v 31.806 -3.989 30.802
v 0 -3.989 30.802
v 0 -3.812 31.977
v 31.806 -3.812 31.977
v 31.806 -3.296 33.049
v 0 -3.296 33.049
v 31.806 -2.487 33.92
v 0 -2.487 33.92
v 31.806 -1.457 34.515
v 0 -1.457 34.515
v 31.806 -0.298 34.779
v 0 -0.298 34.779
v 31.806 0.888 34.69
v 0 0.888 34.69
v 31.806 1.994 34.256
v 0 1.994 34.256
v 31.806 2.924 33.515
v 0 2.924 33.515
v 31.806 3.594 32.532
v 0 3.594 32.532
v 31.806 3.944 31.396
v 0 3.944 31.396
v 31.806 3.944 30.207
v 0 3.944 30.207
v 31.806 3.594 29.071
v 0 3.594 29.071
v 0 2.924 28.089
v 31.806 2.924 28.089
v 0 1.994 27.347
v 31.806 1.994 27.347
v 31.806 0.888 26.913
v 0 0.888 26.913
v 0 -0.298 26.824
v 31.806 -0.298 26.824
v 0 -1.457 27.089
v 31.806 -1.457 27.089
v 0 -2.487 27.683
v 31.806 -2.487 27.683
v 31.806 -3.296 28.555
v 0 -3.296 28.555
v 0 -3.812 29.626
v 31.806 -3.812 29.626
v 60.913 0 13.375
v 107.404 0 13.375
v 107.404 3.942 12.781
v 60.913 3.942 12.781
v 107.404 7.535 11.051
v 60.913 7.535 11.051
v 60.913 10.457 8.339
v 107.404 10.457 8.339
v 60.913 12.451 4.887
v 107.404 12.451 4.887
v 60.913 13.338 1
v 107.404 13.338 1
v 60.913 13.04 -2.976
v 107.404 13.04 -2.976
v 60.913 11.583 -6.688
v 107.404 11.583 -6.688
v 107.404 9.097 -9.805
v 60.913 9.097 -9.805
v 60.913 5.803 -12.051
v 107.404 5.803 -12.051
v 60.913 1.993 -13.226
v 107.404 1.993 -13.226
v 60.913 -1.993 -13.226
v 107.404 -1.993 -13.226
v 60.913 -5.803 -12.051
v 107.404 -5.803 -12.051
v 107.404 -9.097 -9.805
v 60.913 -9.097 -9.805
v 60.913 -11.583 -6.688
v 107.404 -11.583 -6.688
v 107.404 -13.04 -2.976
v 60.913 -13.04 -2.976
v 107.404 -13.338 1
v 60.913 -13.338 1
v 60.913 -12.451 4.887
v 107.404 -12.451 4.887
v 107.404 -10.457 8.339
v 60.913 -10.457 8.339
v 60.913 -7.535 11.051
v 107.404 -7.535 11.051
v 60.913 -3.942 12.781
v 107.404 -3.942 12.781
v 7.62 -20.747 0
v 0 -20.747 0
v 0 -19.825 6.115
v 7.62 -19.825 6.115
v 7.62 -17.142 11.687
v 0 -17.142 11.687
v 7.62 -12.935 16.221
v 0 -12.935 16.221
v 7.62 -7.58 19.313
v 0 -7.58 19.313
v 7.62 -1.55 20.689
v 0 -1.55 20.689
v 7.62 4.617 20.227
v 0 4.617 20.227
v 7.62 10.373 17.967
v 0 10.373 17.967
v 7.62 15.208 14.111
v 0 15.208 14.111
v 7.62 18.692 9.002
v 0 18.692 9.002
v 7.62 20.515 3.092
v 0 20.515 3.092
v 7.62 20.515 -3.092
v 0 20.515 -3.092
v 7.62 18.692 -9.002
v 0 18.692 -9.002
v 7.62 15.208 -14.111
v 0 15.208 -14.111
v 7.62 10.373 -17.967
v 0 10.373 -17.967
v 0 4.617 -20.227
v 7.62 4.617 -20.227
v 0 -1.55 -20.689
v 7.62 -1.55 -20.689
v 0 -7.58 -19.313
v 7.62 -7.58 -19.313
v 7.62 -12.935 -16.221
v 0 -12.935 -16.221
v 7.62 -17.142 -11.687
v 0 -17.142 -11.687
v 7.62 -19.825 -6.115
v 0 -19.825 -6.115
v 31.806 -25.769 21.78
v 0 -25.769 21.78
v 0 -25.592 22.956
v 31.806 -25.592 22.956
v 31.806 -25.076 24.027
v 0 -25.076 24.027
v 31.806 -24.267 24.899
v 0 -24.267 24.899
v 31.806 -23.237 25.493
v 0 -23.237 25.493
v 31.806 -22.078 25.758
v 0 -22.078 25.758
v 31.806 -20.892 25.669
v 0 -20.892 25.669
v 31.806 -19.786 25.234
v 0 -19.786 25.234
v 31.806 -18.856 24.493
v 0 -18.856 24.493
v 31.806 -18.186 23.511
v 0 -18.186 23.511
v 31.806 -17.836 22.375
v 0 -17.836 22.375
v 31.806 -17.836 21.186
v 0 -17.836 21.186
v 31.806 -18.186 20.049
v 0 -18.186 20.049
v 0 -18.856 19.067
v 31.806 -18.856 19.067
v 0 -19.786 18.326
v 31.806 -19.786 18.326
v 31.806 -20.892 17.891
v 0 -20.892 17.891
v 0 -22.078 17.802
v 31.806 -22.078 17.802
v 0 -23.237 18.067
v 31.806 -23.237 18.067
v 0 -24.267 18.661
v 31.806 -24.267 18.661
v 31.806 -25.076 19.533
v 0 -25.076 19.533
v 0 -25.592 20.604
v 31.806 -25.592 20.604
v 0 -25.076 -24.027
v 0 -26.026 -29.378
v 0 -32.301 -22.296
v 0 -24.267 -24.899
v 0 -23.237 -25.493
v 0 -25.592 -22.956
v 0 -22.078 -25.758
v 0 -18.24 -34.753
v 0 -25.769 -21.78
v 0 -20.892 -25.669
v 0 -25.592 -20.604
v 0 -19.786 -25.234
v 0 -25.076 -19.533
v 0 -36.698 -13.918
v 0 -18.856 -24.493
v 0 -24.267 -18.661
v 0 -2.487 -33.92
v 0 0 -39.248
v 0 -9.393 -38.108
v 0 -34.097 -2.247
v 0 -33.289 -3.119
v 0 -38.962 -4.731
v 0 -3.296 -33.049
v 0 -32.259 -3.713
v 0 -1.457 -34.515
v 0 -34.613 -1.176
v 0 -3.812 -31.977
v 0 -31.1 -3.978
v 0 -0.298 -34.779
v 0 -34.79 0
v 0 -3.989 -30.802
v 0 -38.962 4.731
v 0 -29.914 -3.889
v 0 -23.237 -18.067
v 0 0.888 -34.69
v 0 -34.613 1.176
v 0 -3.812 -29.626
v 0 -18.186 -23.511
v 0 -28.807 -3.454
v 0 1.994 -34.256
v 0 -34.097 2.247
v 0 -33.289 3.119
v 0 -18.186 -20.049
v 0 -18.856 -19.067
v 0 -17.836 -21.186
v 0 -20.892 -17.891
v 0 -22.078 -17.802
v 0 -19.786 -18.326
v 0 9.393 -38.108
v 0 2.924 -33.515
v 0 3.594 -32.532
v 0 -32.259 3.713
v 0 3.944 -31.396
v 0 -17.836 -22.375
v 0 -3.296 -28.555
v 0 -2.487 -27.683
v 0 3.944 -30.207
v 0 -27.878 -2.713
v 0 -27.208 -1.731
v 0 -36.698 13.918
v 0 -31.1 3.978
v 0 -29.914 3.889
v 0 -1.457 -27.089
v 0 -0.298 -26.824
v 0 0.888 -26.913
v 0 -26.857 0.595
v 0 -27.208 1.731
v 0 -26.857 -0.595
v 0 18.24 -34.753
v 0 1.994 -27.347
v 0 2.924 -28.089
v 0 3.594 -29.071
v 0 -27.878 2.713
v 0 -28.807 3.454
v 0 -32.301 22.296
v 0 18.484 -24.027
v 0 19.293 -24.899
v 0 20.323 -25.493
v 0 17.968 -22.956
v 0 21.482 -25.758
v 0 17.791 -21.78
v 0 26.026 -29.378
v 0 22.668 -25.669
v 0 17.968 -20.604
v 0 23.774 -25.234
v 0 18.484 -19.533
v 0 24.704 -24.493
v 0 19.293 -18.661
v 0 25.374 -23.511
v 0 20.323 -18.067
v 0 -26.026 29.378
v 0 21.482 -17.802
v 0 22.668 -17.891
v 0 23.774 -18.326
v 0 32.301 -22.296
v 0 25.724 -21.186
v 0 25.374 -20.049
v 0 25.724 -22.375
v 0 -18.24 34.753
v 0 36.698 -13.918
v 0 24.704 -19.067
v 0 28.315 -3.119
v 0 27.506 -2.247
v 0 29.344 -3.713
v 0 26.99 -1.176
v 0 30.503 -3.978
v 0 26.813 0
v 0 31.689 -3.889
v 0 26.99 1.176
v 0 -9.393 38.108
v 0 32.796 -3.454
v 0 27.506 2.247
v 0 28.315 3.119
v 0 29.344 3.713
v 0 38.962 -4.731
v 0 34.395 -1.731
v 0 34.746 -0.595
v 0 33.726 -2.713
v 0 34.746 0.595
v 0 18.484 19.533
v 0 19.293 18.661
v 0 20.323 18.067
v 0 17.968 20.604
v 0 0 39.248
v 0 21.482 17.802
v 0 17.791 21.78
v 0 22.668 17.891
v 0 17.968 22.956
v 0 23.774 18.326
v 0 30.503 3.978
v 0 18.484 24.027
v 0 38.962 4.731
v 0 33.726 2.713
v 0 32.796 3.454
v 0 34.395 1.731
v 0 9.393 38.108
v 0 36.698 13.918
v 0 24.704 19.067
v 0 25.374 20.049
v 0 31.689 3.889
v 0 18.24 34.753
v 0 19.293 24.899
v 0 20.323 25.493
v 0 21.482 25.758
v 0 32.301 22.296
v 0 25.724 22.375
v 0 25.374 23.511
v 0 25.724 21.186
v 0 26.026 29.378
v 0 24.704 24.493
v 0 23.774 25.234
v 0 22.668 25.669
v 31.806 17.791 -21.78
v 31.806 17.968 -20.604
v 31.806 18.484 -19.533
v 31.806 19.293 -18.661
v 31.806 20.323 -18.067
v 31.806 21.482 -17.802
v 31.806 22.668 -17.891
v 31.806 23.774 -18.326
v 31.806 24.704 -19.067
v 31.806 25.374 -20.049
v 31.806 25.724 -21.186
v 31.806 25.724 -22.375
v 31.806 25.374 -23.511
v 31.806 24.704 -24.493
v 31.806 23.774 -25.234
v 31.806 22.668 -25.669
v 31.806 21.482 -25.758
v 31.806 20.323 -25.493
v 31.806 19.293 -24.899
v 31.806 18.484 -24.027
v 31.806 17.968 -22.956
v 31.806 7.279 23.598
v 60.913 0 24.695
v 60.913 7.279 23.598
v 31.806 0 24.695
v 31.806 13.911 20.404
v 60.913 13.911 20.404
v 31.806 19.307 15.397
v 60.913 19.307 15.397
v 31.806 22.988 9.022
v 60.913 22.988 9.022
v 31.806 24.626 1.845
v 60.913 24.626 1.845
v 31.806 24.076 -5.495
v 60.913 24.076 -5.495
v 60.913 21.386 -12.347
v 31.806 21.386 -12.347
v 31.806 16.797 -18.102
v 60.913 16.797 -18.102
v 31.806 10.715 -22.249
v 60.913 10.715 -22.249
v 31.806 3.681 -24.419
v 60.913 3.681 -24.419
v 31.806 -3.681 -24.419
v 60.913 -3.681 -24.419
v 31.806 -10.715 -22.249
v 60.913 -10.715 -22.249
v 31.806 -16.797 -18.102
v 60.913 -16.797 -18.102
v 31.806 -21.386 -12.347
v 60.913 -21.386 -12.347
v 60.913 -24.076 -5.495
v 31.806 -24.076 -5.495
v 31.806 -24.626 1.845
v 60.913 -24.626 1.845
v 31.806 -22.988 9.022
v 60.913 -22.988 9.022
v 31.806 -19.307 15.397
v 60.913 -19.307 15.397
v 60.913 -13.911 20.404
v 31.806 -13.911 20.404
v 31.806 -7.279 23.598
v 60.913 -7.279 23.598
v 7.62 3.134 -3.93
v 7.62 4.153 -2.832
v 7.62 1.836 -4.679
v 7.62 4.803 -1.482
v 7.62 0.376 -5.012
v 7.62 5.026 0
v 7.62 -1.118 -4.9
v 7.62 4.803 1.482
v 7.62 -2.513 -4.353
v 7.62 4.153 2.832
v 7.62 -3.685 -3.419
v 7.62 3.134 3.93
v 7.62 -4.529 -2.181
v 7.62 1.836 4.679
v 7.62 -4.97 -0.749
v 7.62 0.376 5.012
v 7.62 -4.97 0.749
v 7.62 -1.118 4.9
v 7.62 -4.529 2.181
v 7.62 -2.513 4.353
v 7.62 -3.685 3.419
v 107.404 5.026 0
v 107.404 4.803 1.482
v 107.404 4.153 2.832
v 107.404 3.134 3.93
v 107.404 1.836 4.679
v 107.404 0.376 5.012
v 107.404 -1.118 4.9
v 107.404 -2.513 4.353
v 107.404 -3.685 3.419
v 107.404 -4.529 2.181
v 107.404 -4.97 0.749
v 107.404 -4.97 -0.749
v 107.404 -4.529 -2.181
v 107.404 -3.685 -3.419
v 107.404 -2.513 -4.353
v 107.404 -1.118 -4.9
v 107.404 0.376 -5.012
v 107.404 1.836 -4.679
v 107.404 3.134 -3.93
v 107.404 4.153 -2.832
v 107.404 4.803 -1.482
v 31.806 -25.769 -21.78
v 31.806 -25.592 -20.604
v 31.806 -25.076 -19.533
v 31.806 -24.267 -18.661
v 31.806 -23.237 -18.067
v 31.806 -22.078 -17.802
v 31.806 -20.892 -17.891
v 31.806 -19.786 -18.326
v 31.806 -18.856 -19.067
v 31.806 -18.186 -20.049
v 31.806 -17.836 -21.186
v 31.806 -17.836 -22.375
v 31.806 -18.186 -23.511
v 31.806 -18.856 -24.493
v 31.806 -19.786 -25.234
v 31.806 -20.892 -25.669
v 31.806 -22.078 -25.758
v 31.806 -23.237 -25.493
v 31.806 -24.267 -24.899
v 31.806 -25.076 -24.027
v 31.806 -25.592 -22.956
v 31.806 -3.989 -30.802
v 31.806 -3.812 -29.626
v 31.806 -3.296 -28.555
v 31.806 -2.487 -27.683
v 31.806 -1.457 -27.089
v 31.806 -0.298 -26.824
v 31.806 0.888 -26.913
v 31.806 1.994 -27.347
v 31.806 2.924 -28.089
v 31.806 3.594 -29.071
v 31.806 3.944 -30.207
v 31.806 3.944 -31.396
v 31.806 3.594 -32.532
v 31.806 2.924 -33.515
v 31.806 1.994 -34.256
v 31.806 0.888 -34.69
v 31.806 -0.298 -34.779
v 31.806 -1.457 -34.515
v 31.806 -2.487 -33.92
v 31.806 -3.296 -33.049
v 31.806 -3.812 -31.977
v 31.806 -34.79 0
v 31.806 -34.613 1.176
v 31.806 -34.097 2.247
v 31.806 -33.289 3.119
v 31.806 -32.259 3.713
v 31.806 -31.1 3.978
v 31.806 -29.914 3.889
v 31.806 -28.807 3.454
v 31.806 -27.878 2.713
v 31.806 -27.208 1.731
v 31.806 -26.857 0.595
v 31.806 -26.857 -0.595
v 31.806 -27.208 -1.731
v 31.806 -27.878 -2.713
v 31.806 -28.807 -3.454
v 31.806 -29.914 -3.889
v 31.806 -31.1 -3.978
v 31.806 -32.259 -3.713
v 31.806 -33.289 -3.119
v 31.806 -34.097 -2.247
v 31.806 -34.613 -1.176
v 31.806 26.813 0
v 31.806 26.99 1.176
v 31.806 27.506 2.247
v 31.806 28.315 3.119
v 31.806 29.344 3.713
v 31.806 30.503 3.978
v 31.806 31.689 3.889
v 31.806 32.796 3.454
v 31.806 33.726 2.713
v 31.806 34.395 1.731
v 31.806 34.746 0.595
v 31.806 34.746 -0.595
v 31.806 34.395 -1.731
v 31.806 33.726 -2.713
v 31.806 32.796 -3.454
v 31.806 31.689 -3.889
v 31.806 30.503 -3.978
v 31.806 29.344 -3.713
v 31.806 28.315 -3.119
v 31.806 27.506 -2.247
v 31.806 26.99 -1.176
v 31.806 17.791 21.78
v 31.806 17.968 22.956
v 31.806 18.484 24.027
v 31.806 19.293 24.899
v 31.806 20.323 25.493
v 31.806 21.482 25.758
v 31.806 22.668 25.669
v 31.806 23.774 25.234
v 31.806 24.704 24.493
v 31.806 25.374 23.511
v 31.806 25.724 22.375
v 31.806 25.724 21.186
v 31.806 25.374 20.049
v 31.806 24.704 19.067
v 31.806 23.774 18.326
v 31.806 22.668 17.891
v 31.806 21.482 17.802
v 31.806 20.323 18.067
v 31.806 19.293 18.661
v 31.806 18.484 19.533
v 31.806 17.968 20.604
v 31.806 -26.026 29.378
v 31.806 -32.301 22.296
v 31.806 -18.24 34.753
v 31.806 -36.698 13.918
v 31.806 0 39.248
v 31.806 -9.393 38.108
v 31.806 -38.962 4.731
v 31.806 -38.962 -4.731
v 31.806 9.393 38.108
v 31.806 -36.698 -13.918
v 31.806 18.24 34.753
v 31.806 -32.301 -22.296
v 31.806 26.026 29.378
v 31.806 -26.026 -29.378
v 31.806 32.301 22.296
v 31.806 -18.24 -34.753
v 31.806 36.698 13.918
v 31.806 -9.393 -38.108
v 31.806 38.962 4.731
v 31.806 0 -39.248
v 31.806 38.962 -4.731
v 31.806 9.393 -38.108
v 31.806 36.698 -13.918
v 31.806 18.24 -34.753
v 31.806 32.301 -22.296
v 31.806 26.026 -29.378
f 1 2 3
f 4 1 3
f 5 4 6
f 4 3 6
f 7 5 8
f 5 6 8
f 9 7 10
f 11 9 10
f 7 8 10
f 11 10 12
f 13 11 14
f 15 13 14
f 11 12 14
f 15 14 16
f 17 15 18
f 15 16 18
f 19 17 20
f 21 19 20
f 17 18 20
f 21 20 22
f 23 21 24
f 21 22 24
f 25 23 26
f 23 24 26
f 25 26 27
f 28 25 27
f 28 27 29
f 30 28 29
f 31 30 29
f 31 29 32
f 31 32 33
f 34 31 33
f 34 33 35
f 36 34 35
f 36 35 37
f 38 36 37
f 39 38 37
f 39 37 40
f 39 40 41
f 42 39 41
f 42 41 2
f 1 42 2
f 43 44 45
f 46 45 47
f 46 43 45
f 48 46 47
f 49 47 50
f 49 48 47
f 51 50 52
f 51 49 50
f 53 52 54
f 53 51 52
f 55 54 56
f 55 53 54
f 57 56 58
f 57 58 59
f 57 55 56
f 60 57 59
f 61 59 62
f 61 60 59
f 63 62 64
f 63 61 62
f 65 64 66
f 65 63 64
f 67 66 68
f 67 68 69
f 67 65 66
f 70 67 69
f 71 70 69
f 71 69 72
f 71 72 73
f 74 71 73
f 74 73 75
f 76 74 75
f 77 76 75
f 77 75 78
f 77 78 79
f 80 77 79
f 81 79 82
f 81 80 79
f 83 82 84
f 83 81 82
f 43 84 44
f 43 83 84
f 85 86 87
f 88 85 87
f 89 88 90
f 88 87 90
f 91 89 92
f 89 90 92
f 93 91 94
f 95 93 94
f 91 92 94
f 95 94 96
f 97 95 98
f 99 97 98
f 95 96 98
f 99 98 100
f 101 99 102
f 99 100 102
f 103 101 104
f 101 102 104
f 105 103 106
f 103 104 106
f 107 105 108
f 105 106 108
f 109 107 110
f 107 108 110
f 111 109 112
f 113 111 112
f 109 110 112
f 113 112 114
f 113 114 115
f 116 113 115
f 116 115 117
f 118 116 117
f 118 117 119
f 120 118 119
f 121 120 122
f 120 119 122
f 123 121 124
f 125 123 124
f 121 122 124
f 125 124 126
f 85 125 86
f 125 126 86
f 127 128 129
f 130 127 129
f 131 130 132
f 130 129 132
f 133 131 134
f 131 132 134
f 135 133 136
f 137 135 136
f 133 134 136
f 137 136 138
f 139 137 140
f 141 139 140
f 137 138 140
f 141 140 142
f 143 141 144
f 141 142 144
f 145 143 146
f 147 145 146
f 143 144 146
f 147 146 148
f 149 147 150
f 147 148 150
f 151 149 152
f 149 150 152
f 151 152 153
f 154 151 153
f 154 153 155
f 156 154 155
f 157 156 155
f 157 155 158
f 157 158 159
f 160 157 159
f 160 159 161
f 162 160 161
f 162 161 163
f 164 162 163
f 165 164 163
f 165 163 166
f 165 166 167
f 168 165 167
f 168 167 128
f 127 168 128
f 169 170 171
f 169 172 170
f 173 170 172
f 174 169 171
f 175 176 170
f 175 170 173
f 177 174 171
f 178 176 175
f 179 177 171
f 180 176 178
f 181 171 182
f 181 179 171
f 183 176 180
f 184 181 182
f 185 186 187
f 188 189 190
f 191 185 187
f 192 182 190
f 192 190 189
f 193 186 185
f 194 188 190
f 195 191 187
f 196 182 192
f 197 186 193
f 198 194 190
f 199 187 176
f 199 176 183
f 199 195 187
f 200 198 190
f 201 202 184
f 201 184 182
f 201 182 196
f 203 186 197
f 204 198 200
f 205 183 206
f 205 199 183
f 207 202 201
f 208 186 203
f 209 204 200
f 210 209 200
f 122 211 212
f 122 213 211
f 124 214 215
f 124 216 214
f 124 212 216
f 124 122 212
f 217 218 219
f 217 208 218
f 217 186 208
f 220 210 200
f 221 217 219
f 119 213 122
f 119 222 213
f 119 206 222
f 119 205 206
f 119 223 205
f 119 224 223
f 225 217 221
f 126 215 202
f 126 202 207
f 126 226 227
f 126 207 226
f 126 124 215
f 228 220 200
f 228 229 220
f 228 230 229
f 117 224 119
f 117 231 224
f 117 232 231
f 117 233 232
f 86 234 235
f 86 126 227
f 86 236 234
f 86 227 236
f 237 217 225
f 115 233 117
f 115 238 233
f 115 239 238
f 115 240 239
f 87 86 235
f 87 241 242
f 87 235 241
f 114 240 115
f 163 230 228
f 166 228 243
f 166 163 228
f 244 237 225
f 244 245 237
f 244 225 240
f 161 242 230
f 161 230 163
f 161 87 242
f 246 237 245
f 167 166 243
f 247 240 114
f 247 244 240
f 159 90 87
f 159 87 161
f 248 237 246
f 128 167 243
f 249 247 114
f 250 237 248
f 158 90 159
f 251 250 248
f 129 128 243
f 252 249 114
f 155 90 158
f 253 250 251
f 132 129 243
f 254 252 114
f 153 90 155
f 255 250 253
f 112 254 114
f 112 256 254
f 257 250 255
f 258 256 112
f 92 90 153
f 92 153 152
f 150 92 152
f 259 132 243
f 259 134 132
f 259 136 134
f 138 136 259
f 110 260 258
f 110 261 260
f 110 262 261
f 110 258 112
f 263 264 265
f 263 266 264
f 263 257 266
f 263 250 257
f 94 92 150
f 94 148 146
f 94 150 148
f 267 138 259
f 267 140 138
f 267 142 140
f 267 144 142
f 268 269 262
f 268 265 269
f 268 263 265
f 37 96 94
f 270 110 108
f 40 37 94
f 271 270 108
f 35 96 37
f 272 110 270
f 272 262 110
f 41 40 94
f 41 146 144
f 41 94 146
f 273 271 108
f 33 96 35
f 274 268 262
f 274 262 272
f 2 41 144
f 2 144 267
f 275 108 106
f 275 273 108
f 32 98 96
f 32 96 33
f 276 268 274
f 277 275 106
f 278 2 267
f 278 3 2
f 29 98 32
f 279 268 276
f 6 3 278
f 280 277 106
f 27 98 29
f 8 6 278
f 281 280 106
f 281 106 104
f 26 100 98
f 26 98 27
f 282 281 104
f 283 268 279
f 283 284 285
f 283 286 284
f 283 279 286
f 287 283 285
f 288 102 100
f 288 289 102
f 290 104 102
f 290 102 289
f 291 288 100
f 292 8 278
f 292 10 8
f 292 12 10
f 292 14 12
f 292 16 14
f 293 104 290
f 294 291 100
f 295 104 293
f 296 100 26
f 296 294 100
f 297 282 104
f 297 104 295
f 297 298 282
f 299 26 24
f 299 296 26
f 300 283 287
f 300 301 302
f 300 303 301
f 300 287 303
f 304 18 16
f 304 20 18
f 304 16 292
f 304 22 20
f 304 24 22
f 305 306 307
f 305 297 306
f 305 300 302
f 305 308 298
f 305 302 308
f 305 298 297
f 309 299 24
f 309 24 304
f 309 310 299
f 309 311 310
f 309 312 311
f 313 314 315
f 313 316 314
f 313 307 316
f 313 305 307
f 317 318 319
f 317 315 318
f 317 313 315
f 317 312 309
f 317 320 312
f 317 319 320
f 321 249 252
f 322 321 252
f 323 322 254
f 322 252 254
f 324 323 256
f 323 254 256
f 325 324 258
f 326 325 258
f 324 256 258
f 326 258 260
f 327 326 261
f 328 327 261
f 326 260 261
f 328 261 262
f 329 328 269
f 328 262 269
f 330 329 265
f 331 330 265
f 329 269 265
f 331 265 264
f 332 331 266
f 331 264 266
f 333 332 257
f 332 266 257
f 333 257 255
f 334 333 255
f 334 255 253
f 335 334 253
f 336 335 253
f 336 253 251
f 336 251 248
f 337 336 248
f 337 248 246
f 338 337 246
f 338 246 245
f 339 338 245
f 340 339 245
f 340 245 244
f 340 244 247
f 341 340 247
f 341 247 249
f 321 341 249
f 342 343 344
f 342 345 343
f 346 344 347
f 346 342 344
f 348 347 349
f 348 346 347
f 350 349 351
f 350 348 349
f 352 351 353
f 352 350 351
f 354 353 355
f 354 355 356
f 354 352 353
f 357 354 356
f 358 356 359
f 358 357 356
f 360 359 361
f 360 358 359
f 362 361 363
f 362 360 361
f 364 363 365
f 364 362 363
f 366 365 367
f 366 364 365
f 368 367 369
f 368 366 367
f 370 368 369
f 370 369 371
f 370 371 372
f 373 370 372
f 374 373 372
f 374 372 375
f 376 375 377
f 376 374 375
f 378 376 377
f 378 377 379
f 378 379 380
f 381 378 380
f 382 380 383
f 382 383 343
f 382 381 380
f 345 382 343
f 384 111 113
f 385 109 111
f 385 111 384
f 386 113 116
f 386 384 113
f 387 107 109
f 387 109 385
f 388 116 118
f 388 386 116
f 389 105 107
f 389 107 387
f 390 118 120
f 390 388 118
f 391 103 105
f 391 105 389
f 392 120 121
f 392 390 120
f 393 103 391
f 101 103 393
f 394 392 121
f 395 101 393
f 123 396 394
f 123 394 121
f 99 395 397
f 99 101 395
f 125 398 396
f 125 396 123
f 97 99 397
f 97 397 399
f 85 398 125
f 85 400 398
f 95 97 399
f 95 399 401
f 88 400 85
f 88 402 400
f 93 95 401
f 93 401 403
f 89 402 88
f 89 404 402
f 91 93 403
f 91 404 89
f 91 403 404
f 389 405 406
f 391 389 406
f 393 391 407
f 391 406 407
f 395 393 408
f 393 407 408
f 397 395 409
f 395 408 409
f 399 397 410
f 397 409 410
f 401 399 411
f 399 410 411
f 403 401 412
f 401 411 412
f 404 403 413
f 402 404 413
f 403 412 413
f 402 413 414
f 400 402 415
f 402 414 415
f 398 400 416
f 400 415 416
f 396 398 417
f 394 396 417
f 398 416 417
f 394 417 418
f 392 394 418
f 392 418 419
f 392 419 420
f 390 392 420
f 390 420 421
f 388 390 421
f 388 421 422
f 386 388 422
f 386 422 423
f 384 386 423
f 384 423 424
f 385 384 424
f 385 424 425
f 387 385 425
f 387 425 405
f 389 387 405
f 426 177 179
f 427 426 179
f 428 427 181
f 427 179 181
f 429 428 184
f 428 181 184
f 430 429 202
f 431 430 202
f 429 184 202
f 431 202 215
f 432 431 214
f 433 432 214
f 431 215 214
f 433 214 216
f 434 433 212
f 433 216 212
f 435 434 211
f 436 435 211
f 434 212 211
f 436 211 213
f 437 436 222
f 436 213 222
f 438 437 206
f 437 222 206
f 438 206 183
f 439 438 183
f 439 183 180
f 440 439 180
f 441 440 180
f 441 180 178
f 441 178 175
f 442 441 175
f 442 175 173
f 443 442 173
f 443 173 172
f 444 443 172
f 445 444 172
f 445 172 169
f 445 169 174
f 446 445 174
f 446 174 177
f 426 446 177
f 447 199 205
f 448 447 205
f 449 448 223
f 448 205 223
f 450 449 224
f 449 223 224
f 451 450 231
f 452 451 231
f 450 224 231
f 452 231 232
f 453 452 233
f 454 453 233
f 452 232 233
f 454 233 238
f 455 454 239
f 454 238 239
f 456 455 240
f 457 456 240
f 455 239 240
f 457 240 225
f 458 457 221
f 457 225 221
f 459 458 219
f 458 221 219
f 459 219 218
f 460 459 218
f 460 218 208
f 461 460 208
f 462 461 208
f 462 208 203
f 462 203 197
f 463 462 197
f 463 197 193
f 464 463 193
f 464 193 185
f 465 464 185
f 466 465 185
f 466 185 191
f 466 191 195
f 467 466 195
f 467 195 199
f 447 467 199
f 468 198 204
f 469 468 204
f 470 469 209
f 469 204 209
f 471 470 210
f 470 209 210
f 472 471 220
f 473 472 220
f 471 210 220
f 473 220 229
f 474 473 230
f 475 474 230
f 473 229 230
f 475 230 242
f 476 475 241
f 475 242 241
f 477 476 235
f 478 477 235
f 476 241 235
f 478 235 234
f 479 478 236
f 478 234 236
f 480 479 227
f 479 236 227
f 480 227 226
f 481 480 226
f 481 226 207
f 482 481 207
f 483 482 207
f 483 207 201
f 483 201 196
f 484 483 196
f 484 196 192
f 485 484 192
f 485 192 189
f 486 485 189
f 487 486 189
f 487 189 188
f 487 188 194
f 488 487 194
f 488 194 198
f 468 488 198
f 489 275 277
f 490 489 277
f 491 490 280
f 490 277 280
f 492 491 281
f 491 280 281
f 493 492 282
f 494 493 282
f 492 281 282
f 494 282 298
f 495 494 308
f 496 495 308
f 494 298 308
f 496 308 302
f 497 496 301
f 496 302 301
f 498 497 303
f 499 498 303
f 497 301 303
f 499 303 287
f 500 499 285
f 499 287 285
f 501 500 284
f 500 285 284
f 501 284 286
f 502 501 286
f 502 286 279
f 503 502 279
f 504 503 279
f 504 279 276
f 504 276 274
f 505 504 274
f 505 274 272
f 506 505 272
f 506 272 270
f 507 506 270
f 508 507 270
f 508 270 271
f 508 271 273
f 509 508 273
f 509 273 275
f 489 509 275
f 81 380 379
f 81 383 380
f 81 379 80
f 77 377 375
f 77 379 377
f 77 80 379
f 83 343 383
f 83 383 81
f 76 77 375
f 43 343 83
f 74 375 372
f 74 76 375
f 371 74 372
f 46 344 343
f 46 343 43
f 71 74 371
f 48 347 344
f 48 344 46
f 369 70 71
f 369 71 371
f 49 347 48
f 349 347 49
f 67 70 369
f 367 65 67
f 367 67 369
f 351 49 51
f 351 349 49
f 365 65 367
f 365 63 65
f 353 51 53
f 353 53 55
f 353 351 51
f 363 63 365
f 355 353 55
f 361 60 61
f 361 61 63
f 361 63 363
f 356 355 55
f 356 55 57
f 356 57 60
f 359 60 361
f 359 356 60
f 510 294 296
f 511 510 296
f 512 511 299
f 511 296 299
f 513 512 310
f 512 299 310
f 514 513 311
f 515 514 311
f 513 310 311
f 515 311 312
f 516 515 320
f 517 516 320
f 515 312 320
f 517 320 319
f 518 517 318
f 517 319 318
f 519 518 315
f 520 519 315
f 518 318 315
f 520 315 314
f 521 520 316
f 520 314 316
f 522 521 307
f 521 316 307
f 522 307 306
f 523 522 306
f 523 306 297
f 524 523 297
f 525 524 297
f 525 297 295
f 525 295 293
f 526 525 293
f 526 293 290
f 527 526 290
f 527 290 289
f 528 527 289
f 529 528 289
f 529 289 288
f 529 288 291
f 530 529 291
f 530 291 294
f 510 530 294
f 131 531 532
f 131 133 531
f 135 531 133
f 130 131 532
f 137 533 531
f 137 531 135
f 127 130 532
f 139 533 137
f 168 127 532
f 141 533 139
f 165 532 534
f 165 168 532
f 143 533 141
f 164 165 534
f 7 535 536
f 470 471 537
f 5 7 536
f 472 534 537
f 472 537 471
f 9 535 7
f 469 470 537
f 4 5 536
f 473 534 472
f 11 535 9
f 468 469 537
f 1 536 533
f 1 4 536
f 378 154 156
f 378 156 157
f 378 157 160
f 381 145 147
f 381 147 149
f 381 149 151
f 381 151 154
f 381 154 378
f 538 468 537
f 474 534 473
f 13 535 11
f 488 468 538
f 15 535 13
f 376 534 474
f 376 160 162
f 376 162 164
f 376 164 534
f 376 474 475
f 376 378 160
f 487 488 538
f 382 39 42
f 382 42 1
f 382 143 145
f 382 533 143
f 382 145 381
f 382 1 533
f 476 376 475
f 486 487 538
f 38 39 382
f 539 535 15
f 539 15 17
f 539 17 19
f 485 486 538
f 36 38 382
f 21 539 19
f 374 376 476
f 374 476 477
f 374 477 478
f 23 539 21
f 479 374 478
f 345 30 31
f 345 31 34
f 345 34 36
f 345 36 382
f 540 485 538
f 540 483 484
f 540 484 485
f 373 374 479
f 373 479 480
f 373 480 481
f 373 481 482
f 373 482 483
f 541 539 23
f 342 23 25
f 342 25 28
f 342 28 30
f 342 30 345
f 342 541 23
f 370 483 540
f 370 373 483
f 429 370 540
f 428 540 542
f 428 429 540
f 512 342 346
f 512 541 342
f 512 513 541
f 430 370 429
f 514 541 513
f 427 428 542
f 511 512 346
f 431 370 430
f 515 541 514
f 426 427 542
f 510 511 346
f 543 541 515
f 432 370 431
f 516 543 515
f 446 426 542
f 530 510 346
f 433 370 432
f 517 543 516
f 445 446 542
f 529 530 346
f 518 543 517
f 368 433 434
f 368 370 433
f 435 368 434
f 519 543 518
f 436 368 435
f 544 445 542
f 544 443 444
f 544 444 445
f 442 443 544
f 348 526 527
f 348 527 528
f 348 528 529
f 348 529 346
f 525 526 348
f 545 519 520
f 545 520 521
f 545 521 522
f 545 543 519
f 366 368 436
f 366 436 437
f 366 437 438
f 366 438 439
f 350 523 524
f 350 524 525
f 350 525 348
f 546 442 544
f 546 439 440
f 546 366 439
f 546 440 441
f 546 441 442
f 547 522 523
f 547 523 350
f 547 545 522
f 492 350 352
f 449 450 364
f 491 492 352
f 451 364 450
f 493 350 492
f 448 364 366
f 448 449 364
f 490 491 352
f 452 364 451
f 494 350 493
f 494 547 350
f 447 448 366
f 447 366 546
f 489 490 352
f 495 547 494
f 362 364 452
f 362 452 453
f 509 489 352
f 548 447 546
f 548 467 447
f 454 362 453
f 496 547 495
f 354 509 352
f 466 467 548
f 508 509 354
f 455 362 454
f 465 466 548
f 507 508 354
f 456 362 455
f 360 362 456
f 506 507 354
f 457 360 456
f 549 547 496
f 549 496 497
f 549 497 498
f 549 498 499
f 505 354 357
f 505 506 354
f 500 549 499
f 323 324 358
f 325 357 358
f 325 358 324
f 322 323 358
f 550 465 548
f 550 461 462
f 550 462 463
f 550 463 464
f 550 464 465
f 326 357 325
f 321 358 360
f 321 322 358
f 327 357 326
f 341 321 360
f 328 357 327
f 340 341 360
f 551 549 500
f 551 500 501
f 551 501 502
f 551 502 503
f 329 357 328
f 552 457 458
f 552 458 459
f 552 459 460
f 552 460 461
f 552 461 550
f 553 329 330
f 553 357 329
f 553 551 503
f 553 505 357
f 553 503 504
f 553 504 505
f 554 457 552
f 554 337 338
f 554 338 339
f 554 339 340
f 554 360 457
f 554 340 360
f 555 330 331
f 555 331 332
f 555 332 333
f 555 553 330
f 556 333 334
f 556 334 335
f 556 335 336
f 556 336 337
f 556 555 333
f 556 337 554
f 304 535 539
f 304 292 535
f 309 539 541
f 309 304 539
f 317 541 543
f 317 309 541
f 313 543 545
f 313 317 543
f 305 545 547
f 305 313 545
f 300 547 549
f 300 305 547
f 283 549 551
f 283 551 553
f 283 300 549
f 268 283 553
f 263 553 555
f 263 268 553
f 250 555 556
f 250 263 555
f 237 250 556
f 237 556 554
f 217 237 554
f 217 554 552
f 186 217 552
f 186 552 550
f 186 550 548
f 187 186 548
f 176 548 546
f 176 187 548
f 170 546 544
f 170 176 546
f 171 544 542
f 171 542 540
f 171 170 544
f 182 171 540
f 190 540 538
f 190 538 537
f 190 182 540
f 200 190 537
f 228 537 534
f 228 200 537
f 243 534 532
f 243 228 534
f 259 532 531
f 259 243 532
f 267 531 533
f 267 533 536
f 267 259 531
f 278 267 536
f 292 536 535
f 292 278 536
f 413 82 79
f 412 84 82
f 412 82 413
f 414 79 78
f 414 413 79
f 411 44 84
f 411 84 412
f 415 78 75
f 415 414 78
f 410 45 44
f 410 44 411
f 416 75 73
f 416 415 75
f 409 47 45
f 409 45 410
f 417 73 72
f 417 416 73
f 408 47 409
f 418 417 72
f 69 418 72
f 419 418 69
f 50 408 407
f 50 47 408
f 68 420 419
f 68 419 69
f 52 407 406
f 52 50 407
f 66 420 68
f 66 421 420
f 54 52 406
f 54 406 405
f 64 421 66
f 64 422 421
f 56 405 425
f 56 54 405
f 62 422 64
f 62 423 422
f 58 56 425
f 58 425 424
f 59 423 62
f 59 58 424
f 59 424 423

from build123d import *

# Parameters (mm, degrees)
F2_R     = 20.746813
F3_DEPTH = 7.62
F4_R     = 5.02647
F5_DEPTH = 107.404763
F6_R     = 3.988802
F7_DEPTH = 107.404763


with BuildPart() as f1:
    # F0 (on Front) → F1 (revolve)
    with BuildSketch(Plane.XZ):
        Polygon((0, 39.248202), (0, 0), (107.403763, 0), (107.403763, 13.375257), (60.913306, 13.375257), (60.913306, 24.69467), (31.806249, 24.69467), (31.806249, 39.248202), align=None)
    revolve(axis=Axis((53.701881, 0, 0), (-1, 0, 0)))

    # F2 (on face) → F3 (cut)
    with BuildSketch(Plane(origin=(0, 0, 0), x_dir=(0, -1, 0), z_dir=(-1, 0, 0))):
        Circle(F2_R)
    extrude(amount=-F3_DEPTH, mode=Mode.SUBTRACT)

    # F4 (on face) → F5 (cut, through all)
    with BuildSketch(Plane.YZ.offset(107.403763)):
        Circle(F4_R)
    extrude(amount=-F5_DEPTH, mode=Mode.SUBTRACT)

    # F6 (on face) → F7 (cut, through all)
    with BuildSketch(Plane(origin=(0, 0, 0), x_dir=(0, -1, 0), z_dir=(-1, 0, 0))):
        with Locations((0, 30.801583)):
            Circle(F6_R)
        with Locations((-21.780009, 21.780009)):
            Circle(F6_R)
        with Locations((-30.801583, 0)):
            Circle(F6_R)
        with Locations((-21.780009, -21.780009)):
            Circle(F6_R)
        with Locations((0, -30.801583)):
            Circle(F6_R)
        with Locations((21.780009, -21.780009)):
            Circle(F6_R)
        with Locations((30.801583, 0)):
            Circle(F6_R)
        with Locations((21.780009, 21.780009)):
            Circle(F6_R)
    extrude(amount=-F7_DEPTH, mode=Mode.SUBTRACT)


solid = f1.part
